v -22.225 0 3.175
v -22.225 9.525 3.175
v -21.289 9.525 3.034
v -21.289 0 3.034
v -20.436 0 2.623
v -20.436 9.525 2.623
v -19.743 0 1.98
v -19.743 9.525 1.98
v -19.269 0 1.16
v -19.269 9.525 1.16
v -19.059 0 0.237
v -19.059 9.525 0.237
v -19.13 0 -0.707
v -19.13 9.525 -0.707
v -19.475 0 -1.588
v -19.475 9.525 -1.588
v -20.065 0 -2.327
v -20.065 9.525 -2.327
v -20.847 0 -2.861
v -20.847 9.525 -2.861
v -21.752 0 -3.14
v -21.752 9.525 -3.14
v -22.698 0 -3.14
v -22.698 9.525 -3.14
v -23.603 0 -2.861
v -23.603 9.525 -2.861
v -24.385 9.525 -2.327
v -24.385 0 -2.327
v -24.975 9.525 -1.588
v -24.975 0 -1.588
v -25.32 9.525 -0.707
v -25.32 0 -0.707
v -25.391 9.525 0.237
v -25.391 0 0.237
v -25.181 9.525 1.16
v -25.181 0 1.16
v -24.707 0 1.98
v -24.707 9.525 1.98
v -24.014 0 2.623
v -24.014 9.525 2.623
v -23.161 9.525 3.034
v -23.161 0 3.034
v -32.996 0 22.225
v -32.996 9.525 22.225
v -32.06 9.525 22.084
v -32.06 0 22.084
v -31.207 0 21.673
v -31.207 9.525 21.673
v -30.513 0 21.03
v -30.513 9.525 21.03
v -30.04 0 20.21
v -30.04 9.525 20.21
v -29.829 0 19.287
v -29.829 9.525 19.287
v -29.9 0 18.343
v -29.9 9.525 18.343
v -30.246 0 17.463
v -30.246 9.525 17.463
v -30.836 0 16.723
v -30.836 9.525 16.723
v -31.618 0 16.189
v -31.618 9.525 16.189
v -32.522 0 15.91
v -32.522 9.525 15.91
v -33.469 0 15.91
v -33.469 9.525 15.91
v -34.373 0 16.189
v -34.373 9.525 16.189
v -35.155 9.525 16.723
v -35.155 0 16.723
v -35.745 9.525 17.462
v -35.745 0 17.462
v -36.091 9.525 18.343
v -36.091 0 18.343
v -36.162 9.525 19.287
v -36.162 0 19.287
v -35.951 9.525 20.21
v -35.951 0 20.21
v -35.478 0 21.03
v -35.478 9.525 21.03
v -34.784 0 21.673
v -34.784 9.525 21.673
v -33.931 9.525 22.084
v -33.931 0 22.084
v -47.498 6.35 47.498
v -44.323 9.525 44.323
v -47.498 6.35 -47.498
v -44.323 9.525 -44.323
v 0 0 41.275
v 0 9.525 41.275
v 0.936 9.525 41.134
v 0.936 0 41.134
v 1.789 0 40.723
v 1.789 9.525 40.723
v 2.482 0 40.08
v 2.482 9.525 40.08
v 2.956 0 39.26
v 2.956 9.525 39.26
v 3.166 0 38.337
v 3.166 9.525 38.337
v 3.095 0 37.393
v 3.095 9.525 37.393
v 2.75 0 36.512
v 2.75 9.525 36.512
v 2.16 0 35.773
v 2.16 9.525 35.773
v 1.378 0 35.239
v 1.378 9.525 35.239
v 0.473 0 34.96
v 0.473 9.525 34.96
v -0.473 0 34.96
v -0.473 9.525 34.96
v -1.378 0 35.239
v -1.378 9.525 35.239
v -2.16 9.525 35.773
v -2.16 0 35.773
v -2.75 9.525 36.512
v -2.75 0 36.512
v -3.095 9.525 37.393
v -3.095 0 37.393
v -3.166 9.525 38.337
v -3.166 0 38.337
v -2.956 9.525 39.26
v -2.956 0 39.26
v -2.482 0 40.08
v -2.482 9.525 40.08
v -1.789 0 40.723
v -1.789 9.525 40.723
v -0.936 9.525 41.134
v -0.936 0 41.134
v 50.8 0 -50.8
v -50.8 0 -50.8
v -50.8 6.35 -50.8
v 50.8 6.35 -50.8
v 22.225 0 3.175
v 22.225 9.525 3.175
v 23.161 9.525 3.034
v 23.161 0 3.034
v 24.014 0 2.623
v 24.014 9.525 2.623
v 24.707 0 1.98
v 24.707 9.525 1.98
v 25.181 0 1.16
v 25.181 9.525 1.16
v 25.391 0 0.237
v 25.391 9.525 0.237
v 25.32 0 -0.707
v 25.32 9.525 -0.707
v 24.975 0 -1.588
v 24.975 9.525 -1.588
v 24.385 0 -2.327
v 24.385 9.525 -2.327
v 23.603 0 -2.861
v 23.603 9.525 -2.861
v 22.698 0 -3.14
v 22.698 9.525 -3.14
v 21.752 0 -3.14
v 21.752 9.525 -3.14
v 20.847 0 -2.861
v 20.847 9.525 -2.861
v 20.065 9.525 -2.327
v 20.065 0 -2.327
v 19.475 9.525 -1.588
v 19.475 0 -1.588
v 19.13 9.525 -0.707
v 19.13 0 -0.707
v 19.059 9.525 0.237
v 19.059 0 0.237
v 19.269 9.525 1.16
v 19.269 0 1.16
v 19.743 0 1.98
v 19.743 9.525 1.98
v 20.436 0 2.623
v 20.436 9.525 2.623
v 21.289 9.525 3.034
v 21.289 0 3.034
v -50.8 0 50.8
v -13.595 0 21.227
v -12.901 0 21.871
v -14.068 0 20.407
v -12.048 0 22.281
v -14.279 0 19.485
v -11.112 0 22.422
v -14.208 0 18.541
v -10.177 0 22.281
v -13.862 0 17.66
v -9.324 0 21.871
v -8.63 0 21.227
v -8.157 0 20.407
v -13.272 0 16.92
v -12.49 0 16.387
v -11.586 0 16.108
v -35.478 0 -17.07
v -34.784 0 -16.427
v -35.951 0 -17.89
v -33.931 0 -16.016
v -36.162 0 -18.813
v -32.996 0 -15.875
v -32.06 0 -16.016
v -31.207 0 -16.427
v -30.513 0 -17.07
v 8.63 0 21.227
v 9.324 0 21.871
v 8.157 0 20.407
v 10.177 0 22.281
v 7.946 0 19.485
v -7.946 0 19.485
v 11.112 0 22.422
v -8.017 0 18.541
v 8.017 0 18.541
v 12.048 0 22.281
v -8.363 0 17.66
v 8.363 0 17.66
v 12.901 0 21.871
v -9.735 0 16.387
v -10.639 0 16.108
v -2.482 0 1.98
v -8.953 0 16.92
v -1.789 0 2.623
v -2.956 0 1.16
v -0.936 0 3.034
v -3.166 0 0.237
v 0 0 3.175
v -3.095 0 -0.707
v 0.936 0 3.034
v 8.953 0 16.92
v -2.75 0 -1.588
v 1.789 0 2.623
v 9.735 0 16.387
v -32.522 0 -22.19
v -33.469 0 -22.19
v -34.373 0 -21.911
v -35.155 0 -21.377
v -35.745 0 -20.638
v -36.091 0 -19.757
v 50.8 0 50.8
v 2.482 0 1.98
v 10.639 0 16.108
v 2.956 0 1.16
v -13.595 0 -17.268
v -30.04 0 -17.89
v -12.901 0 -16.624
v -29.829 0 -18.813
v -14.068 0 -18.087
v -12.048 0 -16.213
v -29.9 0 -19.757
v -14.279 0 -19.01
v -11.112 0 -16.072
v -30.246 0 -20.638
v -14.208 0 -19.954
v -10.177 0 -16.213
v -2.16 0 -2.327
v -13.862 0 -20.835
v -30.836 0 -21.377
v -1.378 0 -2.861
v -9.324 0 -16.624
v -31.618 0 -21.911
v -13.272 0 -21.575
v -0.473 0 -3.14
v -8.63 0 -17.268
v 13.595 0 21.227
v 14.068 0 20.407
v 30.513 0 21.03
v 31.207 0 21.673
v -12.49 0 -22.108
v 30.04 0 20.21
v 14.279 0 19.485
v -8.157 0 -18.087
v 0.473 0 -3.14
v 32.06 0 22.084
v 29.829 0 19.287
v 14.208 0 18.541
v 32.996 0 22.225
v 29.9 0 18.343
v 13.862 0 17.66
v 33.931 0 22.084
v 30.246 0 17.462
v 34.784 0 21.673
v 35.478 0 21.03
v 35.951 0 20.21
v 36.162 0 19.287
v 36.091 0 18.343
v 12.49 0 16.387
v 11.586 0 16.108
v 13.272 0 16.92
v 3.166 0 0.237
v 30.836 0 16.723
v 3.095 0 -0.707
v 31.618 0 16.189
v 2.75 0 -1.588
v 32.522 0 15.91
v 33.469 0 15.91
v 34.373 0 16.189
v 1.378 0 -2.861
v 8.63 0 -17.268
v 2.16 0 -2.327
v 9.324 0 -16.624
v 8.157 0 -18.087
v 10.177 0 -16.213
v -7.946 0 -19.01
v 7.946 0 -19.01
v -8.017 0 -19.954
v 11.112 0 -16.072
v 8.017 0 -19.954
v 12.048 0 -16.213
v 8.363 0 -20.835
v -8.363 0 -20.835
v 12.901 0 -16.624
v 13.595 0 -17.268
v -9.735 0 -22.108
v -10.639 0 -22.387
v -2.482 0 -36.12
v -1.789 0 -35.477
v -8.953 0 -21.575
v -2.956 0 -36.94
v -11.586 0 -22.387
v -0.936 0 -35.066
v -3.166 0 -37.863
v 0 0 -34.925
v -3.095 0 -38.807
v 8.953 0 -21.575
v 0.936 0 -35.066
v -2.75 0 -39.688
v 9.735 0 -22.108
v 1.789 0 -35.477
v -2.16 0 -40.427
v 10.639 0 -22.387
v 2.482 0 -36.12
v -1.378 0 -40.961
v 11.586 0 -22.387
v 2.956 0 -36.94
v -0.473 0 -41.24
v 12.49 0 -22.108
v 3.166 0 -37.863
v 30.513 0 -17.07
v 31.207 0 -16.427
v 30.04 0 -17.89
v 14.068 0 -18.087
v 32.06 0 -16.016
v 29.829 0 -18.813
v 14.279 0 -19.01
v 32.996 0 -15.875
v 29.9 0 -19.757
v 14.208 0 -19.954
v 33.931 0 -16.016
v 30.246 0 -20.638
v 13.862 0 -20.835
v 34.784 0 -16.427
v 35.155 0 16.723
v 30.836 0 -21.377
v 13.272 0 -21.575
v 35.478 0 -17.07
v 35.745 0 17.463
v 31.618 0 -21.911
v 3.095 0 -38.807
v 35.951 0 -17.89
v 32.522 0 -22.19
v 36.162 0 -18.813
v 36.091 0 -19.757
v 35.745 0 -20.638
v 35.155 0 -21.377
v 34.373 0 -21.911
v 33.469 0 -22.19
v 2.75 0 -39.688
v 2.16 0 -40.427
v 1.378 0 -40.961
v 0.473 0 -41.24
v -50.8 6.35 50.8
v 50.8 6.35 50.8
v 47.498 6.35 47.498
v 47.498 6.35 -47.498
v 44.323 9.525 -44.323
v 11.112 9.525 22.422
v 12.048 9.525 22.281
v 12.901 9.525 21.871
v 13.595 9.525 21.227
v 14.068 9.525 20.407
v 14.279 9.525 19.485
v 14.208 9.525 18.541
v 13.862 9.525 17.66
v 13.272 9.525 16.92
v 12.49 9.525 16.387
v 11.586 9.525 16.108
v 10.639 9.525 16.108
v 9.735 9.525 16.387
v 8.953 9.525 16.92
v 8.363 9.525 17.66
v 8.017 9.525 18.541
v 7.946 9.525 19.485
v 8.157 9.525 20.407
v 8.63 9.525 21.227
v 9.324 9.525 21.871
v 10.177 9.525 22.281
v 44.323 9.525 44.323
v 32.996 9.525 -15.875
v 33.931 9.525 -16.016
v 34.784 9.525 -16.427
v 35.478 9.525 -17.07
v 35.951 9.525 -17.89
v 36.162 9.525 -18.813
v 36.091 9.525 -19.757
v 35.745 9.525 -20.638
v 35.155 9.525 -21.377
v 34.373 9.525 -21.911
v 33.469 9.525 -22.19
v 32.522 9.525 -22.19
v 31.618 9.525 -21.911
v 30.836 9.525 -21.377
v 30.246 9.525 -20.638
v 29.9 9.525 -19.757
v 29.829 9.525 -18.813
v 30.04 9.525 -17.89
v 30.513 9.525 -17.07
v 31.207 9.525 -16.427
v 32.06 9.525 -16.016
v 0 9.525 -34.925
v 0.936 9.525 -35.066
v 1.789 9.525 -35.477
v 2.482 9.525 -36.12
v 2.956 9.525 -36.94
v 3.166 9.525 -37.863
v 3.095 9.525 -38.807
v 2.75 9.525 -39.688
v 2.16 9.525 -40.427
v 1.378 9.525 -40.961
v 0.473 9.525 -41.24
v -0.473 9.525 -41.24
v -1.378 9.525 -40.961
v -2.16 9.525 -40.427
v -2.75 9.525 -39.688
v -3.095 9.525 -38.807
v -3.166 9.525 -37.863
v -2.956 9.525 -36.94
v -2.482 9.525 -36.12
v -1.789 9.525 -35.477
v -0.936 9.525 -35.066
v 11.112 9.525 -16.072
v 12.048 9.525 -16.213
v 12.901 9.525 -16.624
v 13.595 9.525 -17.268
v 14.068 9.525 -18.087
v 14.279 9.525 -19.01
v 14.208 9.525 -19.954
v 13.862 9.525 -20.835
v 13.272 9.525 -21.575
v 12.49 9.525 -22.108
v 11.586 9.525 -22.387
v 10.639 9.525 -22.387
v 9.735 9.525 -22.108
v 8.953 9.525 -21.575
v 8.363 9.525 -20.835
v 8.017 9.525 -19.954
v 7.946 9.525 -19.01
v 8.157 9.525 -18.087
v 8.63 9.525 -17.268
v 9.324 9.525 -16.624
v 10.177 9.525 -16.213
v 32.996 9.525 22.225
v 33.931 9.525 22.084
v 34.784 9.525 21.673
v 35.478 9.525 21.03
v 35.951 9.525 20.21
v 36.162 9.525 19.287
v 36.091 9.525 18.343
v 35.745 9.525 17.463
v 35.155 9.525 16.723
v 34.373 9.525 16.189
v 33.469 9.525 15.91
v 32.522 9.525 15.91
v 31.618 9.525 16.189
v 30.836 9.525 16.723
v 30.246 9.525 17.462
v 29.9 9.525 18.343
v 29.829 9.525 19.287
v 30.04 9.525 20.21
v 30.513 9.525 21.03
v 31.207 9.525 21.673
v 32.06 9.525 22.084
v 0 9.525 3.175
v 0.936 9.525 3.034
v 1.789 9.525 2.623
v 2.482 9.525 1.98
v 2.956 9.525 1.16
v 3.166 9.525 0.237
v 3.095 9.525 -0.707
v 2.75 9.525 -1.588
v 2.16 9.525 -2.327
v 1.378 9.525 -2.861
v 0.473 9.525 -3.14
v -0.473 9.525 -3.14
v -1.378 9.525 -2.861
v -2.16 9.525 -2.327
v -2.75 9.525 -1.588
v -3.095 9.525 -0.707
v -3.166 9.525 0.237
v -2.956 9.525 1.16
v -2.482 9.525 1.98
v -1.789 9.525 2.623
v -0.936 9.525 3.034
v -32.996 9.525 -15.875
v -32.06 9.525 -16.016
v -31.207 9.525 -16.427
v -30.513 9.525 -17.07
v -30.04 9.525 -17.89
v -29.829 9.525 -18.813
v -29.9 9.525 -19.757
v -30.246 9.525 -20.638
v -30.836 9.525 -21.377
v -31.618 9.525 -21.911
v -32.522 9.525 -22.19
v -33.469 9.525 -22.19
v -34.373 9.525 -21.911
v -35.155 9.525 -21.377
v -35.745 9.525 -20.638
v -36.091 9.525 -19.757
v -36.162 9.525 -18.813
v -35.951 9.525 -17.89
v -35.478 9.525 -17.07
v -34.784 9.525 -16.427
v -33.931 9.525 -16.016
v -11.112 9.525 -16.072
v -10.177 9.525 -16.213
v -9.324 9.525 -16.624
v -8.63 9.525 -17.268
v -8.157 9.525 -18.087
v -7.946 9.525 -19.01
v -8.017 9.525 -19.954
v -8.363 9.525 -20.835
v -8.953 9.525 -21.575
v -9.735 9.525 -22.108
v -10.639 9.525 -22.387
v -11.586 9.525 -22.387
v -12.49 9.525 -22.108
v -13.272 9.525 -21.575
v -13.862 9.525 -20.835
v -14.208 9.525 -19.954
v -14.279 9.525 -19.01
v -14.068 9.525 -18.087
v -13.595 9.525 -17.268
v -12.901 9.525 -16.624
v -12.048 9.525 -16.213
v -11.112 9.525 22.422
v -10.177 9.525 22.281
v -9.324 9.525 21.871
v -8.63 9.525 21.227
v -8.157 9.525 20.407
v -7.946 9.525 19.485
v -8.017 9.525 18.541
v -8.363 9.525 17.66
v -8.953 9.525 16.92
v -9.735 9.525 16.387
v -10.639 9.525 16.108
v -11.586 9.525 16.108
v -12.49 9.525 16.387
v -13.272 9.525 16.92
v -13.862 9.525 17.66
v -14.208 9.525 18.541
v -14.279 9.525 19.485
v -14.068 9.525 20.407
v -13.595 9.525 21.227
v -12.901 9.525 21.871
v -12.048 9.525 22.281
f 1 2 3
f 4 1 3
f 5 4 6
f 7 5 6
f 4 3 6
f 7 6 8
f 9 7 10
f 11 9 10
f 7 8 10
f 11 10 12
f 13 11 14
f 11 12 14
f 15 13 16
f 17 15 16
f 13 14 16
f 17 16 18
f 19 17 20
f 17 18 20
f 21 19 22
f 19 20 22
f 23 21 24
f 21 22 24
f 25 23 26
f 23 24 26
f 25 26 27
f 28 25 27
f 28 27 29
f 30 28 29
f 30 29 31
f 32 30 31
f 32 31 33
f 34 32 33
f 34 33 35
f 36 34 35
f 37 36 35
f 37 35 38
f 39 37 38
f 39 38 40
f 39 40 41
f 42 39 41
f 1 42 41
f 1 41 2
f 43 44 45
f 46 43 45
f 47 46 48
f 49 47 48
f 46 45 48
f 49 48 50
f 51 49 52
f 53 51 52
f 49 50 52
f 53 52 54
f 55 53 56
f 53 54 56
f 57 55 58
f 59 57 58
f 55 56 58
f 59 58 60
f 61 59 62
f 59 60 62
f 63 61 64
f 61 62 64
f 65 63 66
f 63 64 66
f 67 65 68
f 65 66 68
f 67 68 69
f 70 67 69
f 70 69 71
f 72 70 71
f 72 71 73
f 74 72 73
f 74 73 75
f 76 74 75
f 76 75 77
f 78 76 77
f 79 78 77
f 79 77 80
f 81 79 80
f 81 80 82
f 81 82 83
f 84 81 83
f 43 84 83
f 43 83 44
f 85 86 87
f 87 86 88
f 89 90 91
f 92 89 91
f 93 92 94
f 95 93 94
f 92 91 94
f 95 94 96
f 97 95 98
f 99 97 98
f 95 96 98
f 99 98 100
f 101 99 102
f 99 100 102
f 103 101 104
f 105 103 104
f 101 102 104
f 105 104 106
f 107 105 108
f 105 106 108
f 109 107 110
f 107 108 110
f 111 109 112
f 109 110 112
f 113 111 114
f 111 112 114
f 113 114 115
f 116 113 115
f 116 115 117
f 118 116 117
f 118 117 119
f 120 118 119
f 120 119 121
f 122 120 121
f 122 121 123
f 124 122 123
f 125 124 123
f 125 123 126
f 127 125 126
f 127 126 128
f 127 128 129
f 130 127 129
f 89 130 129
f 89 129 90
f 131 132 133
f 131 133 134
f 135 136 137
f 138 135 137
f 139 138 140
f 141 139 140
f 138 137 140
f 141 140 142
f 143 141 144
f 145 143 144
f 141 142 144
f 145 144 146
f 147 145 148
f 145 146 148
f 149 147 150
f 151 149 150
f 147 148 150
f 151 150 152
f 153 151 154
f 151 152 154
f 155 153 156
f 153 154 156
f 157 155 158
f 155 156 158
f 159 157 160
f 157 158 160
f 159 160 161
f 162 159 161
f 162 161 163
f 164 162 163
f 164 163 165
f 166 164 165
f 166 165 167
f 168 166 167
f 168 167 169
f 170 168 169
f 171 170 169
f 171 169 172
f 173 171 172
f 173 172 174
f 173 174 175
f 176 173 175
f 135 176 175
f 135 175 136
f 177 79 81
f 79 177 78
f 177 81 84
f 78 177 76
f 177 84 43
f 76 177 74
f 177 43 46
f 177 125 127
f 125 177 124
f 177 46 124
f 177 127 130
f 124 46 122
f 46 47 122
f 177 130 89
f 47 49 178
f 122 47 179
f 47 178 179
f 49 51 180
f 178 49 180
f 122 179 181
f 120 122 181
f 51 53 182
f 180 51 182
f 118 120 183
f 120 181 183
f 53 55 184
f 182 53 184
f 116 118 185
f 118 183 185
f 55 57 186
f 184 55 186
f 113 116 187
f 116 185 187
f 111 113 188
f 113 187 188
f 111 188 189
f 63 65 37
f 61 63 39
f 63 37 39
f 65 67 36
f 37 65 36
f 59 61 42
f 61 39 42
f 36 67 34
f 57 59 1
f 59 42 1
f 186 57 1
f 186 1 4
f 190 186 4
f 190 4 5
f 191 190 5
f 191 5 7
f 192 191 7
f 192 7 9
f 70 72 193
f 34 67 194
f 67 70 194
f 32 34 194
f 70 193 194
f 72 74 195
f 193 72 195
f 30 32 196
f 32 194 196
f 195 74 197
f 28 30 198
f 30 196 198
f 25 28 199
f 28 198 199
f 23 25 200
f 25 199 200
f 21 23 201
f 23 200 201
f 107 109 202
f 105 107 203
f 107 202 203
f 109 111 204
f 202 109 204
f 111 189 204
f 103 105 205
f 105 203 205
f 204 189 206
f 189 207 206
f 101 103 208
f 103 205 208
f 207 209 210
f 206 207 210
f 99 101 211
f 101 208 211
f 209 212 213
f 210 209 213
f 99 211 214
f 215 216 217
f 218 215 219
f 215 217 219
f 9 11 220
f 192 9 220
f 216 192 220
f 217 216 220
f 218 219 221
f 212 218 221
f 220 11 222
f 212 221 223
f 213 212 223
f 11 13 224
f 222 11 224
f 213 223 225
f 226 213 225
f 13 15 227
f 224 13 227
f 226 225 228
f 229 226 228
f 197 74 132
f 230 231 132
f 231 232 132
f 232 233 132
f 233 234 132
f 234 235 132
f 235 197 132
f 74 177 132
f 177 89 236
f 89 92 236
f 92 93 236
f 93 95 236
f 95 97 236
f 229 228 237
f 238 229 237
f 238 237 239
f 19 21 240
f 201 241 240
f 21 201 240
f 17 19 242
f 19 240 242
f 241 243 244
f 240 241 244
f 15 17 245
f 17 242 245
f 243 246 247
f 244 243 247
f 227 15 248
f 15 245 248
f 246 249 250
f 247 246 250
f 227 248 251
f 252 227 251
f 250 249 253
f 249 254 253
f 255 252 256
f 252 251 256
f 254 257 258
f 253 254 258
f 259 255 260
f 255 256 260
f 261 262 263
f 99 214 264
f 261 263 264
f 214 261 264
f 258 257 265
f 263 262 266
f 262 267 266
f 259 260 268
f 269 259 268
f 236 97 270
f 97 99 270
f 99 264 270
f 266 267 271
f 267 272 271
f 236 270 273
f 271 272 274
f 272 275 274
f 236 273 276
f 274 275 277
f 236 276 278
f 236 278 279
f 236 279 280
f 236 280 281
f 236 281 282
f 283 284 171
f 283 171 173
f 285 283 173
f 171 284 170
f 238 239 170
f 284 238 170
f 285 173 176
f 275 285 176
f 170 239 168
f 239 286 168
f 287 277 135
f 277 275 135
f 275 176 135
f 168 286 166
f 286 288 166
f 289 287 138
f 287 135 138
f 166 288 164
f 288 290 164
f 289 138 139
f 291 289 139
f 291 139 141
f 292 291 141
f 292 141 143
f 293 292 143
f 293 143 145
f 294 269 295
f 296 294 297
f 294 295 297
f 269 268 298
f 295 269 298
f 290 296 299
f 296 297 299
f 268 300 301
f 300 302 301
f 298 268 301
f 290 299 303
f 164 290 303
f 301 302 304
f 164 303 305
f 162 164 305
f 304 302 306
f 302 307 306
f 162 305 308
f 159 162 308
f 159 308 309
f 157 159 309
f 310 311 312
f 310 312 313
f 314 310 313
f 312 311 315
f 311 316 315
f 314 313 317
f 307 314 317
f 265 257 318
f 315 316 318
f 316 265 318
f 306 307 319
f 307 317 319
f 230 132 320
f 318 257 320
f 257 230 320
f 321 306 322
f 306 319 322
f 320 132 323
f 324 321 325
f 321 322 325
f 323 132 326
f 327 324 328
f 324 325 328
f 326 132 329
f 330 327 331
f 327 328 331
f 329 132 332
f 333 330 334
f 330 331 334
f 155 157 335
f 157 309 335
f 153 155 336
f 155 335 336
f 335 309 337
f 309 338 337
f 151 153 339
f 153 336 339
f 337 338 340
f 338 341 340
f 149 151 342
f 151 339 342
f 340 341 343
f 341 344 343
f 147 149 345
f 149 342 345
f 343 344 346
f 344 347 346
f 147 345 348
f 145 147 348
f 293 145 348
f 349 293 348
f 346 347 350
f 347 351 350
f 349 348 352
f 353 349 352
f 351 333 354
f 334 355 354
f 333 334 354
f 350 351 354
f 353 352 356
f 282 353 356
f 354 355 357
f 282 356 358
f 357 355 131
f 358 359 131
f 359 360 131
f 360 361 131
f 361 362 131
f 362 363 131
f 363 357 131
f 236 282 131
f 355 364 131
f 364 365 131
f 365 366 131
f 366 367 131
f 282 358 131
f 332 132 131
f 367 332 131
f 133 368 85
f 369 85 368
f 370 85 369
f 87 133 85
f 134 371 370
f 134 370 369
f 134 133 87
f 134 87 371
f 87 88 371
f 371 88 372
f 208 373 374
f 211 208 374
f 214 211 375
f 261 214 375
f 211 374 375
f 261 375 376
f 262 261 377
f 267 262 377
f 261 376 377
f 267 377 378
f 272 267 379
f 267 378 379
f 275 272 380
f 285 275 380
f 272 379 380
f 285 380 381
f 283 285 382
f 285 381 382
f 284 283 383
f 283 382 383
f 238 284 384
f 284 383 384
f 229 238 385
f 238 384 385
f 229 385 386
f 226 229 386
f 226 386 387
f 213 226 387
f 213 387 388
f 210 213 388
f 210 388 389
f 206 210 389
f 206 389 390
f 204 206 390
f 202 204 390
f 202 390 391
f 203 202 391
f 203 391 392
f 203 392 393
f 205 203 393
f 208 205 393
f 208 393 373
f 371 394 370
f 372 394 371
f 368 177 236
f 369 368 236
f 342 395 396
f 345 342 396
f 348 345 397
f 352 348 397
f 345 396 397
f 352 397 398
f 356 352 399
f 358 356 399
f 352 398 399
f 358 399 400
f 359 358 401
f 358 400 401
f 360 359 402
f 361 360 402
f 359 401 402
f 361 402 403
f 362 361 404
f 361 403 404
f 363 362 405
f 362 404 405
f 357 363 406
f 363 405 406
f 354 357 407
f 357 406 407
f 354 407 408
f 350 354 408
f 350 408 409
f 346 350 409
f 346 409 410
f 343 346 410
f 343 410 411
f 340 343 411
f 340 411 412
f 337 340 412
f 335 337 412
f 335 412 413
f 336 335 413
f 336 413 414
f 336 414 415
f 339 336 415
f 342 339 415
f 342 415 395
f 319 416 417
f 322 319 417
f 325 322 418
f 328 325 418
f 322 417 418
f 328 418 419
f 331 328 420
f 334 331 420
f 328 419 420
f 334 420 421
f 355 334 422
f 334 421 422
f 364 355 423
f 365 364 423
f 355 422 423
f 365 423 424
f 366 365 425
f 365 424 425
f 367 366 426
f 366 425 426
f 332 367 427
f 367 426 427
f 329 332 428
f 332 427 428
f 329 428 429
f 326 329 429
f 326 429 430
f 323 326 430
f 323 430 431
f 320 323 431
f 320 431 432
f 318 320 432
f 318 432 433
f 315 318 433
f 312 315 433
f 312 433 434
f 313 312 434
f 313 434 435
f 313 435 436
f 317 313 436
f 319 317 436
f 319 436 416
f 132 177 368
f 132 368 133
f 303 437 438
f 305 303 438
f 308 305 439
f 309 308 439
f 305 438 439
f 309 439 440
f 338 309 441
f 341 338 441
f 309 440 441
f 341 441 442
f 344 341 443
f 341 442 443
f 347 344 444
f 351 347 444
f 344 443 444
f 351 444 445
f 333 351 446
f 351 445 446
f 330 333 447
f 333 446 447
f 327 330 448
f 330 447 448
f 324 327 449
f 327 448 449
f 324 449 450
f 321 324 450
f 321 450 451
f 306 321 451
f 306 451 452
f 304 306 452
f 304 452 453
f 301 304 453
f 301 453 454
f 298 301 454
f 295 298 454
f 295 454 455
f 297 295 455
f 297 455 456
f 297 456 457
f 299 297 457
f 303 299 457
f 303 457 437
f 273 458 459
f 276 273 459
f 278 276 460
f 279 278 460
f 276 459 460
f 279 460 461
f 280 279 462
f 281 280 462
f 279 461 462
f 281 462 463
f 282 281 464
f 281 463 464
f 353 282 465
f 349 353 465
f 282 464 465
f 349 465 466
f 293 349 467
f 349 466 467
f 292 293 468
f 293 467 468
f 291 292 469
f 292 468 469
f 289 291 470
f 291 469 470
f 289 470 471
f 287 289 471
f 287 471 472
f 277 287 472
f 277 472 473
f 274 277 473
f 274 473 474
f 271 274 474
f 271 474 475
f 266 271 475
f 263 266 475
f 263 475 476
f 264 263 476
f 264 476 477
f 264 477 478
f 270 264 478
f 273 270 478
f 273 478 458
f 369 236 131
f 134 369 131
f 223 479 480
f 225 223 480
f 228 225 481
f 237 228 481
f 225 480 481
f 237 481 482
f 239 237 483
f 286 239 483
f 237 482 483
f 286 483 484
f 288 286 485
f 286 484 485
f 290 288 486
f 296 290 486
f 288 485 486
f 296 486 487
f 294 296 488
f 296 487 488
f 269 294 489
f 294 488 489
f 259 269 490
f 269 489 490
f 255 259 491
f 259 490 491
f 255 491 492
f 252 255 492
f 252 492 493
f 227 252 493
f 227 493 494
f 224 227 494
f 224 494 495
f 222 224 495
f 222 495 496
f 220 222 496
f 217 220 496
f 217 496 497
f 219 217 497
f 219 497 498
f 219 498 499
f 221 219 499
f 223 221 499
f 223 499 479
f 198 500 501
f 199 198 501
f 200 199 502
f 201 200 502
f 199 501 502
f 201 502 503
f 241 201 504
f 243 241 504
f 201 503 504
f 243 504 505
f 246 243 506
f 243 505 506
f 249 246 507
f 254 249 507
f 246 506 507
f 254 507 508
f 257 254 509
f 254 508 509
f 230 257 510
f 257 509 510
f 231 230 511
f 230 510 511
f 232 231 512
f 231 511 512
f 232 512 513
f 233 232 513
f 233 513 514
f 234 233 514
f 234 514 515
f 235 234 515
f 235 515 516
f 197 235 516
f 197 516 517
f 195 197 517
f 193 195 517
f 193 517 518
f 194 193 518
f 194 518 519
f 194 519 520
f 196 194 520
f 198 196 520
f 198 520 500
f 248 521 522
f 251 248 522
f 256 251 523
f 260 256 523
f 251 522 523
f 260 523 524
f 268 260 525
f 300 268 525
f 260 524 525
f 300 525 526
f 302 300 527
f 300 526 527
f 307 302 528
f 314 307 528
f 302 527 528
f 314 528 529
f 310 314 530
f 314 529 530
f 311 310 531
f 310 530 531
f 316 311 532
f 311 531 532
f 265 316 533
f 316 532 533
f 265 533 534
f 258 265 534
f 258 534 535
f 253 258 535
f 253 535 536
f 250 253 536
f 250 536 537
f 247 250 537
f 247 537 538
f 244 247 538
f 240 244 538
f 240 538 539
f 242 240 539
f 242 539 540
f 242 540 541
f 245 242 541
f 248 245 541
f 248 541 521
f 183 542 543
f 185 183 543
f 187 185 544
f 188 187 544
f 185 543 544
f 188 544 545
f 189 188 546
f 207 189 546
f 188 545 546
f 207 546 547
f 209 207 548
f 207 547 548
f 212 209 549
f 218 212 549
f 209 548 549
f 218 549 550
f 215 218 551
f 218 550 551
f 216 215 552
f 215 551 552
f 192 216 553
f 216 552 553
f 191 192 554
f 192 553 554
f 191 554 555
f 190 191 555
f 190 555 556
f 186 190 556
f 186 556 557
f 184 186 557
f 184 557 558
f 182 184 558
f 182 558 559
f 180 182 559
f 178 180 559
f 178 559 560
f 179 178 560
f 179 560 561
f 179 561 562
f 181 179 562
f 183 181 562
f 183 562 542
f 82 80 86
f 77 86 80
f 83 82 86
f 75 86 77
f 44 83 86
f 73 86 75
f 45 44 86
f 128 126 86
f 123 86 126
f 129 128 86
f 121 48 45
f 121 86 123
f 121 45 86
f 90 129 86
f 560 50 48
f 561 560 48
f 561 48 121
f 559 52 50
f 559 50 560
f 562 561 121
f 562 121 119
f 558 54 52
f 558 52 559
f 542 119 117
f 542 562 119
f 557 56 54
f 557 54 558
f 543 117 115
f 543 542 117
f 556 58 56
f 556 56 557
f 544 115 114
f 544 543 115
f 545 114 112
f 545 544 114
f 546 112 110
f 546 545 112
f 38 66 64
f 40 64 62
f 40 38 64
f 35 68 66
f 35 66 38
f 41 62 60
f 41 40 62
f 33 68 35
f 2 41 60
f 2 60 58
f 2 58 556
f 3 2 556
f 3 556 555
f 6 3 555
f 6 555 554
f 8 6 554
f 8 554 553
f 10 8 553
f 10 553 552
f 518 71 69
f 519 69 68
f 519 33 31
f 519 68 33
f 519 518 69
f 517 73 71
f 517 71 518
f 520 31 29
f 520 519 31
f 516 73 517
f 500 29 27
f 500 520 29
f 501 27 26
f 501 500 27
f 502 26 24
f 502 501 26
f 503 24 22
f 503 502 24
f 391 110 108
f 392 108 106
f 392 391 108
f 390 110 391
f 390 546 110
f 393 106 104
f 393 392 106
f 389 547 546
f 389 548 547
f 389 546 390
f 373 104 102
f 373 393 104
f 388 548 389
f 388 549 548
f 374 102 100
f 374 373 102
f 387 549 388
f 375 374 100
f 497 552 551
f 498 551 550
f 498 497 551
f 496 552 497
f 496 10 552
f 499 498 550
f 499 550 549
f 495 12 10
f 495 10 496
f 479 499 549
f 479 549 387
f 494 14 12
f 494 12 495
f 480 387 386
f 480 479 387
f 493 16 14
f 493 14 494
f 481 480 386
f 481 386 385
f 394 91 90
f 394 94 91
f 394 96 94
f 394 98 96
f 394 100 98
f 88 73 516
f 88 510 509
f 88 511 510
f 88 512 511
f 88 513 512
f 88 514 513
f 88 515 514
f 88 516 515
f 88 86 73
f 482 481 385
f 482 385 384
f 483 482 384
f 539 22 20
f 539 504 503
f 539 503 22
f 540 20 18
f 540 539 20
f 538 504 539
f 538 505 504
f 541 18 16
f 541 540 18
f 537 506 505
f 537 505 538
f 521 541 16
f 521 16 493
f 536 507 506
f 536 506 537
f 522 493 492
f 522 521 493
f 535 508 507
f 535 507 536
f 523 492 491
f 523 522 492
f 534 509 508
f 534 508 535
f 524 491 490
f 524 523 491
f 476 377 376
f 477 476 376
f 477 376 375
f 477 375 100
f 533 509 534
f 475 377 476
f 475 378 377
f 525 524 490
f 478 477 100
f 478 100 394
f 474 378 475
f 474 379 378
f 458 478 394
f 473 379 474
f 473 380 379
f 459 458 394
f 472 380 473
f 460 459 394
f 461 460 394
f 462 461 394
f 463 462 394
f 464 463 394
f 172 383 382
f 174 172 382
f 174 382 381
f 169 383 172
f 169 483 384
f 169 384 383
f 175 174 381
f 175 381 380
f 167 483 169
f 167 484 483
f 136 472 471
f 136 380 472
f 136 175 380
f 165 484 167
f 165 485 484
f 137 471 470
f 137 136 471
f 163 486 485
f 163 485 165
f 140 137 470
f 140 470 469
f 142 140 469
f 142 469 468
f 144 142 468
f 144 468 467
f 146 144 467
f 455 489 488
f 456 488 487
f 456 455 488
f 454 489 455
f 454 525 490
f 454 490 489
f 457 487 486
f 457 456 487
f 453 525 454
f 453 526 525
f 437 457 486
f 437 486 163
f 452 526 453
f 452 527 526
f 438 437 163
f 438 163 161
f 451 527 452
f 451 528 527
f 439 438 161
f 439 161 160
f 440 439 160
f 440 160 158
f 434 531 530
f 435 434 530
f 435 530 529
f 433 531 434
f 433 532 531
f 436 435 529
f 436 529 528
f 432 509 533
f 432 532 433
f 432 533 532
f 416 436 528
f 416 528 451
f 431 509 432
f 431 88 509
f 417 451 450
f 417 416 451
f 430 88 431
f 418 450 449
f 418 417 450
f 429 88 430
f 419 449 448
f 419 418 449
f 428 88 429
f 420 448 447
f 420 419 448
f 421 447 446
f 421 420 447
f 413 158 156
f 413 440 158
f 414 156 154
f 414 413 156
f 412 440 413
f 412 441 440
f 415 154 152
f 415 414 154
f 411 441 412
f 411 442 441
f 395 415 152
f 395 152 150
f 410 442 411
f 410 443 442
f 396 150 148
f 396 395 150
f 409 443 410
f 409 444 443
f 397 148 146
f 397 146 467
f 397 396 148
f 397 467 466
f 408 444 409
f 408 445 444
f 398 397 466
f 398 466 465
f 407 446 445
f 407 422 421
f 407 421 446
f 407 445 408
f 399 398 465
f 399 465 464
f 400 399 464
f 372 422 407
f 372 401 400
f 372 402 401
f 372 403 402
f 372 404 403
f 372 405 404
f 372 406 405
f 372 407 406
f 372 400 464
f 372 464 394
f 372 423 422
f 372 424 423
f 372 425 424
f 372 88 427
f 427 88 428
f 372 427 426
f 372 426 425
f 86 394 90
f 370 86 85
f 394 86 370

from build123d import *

# Parameters (mm, degrees)
SKETCH1_W           = 101.6
SKETCH1_H           = 101.6
BOSS_EXTRUDE1_DEPTH = 9.525
SKETCH2_OUTSIDE_W   = 132.4
SKETCH2_OUTSIDE_H   = 132.4
SKETCH2_OUTSIDE_W_2 = 94.996
SKETCH2_OUTSIDE_H_2 = 94.996
CUT_EXTRUDE1_DEPTH  = 3.175
CHAMFER1_SIZE       = 3.175
CUT_EXTRUDE2_REACH  = 74.471
SKETCH3_R           = 3.175


with BuildPart() as part:
    # Sketch1 → Boss-Extrude1 (new body)
    with BuildSketch(Plane(origin=(0, 0, 0), x_dir=(1, 0, 0), z_dir=(0, 1, 0))):
        Rectangle(SKETCH1_W, SKETCH1_H)
    extrude(amount=BOSS_EXTRUDE1_DEPTH)

    # Sketch2 outside → Cut-Extrude1 (cut)
    with BuildSketch(Plane(origin=(0, 9.525, 0), x_dir=(1, 0, 0), z_dir=(0, 1, 0))):
        Rectangle(SKETCH2_OUTSIDE_W, SKETCH2_OUTSIDE_H)
        Rectangle(SKETCH2_OUTSIDE_W_2, SKETCH2_OUTSIDE_H_2, mode=Mode.SUBTRACT)
    extrude(amount=-CUT_EXTRUDE1_DEPTH, mode=Mode.SUBTRACT)

    # Chamfer1
    chamfer1_edges = [part.edges().sort_by_distance(p)[0] for p in [
        (47.498, 9.525, 0),
        (0, 9.525, -47.498),
        (-47.498, 9.525, 0),
        (0, 9.525, 47.498),
    ]]
    chamfer(chamfer1_edges, length=CHAMFER1_SIZE - 0.0001)  # a hair under: the kernel refuses the full size

    # Sketch3 → Cut-Extrude2 (cut, up to next)
    with BuildSketch(Plane(origin=(0, 9.525, 0), x_dir=(1, 0, 0), z_dir=(0, 1, 0)), mode=Mode.PRIVATE) as cut_extrude2_sk1:
        with Locations(Location((0, 38.1, 0), (0, 0, 270))):
            Circle(SKETCH3_R)
    cut_extrude2_tool1 = extrude(cut_extrude2_sk1.sketch, amount=-CUT_EXTRUDE2_REACH, mode=Mode.PRIVATE) & part.part
    # Sketch3 → Cut-Extrude2 (cut, up to next)
    with BuildSketch(Plane(origin=(0, 9.525, 0), x_dir=(1, 0, 0), z_dir=(0, 1, 0)), mode=Mode.PRIVATE) as cut_extrude2_sk2:
        with Locations(Location((32.995567884, 19.05, 0), (0, 0, 270))):
            Circle(SKETCH3_R)
    cut_extrude2_tool2 = extrude(cut_extrude2_sk2.sketch, amount=-CUT_EXTRUDE2_REACH, mode=Mode.PRIVATE) & part.part
    # Sketch3 → Cut-Extrude2 (cut, up to next)
    with BuildSketch(Plane(origin=(0, 9.525, 0), x_dir=(1, 0, 0), z_dir=(0, 1, 0)), mode=Mode.PRIVATE) as cut_extrude2_sk3:
        with Locations(Location((32.995567884, -19.05, 0), (0, 0, 270))):
            Circle(SKETCH3_R)
    cut_extrude2_tool3 = extrude(cut_extrude2_sk3.sketch, amount=-CUT_EXTRUDE2_REACH, mode=Mode.PRIVATE) & part.part
    # Sketch3 → Cut-Extrude2 (cut, up to next)
    with BuildSketch(Plane(origin=(0, 9.525, 0), x_dir=(1, 0, 0), z_dir=(0, 1, 0)), mode=Mode.PRIVATE) as cut_extrude2_sk4:
        with Locations(Location((0, -38.1, 0), (0, 0, 270))):
            Circle(SKETCH3_R)
    cut_extrude2_tool4 = extrude(cut_extrude2_sk4.sketch, amount=-CUT_EXTRUDE2_REACH, mode=Mode.PRIVATE) & part.part
    # Sketch3 → Cut-Extrude2 (cut, up to next)
    with BuildSketch(Plane(origin=(0, 9.525, 0), x_dir=(1, 0, 0), z_dir=(0, 1, 0)), mode=Mode.PRIVATE) as cut_extrude2_sk5:
        with Locations(Location((-32.995567884, -19.05, 0), (0, 0, 270))):
            Circle(SKETCH3_R)
    cut_extrude2_tool5 = extrude(cut_extrude2_sk5.sketch, amount=-CUT_EXTRUDE2_REACH, mode=Mode.PRIVATE) & part.part
    # Sketch3 → Cut-Extrude2 (cut, up to next)
    with BuildSketch(Plane(origin=(0, 9.525, 0), x_dir=(1, 0, 0), z_dir=(0, 1, 0)), mode=Mode.PRIVATE) as cut_extrude2_sk6:
        with Locations(Location((-32.995567884, 19.05, 0), (0, 0, 270))):
            Circle(SKETCH3_R)
    cut_extrude2_tool6 = extrude(cut_extrude2_sk6.sketch, amount=-CUT_EXTRUDE2_REACH, mode=Mode.PRIVATE) & part.part
    # Sketch3 → Cut-Extrude2 (cut, up to next)
    with BuildSketch(Plane(origin=(0, 9.525, 0), x_dir=(1, 0, 0), z_dir=(0, 1, 0)), mode=Mode.PRIVATE) as cut_extrude2_sk7:
        with Locations(Location((22.225, 0, 0), (0, 0, 270))):
            Circle(SKETCH3_R)
    cut_extrude2_tool7 = extrude(cut_extrude2_sk7.sketch, amount=-CUT_EXTRUDE2_REACH, mode=Mode.PRIVATE) & part.part
    # Sketch3 → Cut-Extrude2 (cut, up to next)
    with BuildSketch(Plane(origin=(0, 9.525, 0), x_dir=(1, 0, 0), z_dir=(0, 1, 0)), mode=Mode.PRIVATE) as cut_extrude2_sk8:
        with Locations(Location((11.1125, -19.247414599, 0), (0, 0, 270))):
            Circle(SKETCH3_R)
    cut_extrude2_tool8 = extrude(cut_extrude2_sk8.sketch, amount=-CUT_EXTRUDE2_REACH, mode=Mode.PRIVATE) & part.part
    # Sketch3 → Cut-Extrude2 (cut, up to next)
    with BuildSketch(Plane(origin=(0, 9.525, 0), x_dir=(1, 0, 0), z_dir=(0, 1, 0)), mode=Mode.PRIVATE) as cut_extrude2_sk9:
        with Locations(Location((-11.1125, -19.247414599, 0), (0, 0, 270))):
            Circle(SKETCH3_R)
    cut_extrude2_tool9 = extrude(cut_extrude2_sk9.sketch, amount=-CUT_EXTRUDE2_REACH, mode=Mode.PRIVATE) & part.part
    # Sketch3 → Cut-Extrude2 (cut, up to next)
    with BuildSketch(Plane(origin=(0, 9.525, 0), x_dir=(1, 0, 0), z_dir=(0, 1, 0)), mode=Mode.PRIVATE) as cut_extrude2_sk10:
        with Locations(Location((-22.225, 0, 0), (0, 0, 270))):
            Circle(SKETCH3_R)
    cut_extrude2_tool10 = extrude(cut_extrude2_sk10.sketch, amount=-CUT_EXTRUDE2_REACH, mode=Mode.PRIVATE) & part.part
    # Sketch3 → Cut-Extrude2 (cut, up to next)
    with BuildSketch(Plane(origin=(0, 9.525, 0), x_dir=(1, 0, 0), z_dir=(0, 1, 0)), mode=Mode.PRIVATE) as cut_extrude2_sk11:
        with Locations(Location((-11.1125, 19.247414599, 0), (0, 0, 270))):
            Circle(SKETCH3_R)
    cut_extrude2_tool11 = extrude(cut_extrude2_sk11.sketch, amount=-CUT_EXTRUDE2_REACH, mode=Mode.PRIVATE) & part.part
    # Sketch3 → Cut-Extrude2 (cut, up to next)
    with BuildSketch(Plane(origin=(0, 9.525, 0), x_dir=(1, 0, 0), z_dir=(0, 1, 0)), mode=Mode.PRIVATE) as cut_extrude2_sk12:
        with Locations(Location((11.1125, 19.247414599, 0), (0, 0, 270))):
            Circle(SKETCH3_R)
    cut_extrude2_tool12 = extrude(cut_extrude2_sk12.sketch, amount=-CUT_EXTRUDE2_REACH, mode=Mode.PRIVATE) & part.part
    # Sketch3 → Cut-Extrude2 (cut, up to next)
    with BuildSketch(Plane(origin=(0, 9.525, 0), x_dir=(1, 0, 0), z_dir=(0, 1, 0)), mode=Mode.PRIVATE) as cut_extrude2_sk13:
        with Locations(Location((0, 0, 0), (0, 0, 270))):
            Circle(SKETCH3_R)
    cut_extrude2_tool13 = extrude(cut_extrude2_sk13.sketch, amount=-CUT_EXTRUDE2_REACH, mode=Mode.PRIVATE) & part.part
    add(cut_extrude2_tool1.solids().sort_by_distance((0, 9.525, -38.1))[0], mode=Mode.SUBTRACT)
    add(cut_extrude2_tool2.solids().sort_by_distance((32.995568, 9.525, -19.05))[0], mode=Mode.SUBTRACT)
    add(cut_extrude2_tool3.solids().sort_by_distance((32.995568, 9.525, 19.05))[0], mode=Mode.SUBTRACT)
    add(cut_extrude2_tool4.solids().sort_by_distance((0, 9.525, 38.1))[0], mode=Mode.SUBTRACT)
    add(cut_extrude2_tool5.solids().sort_by_distance((-32.995568, 9.525, 19.05))[0], mode=Mode.SUBTRACT)
    add(cut_extrude2_tool6.solids().sort_by_distance((-32.995568, 9.525, -19.05))[0], mode=Mode.SUBTRACT)
    add(cut_extrude2_tool7.solids().sort_by_distance((22.225, 9.525, 0))[0], mode=Mode.SUBTRACT)
    add(cut_extrude2_tool8.solids().sort_by_distance((11.1125, 9.525, 19.247415))[0], mode=Mode.SUBTRACT)
    add(cut_extrude2_tool9.solids().sort_by_distance((-11.1125, 9.525, 19.247415))[0], mode=Mode.SUBTRACT)
    add(cut_extrude2_tool10.solids().sort_by_distance((-22.225, 9.525, 0))[0], mode=Mode.SUBTRACT)
    add(cut_extrude2_tool11.solids().sort_by_distance((-11.1125, 9.525, -19.247415))[0], mode=Mode.SUBTRACT)
    add(cut_extrude2_tool12.solids().sort_by_distance((11.1125, 9.525, -19.247415))[0], mode=Mode.SUBTRACT)
    add(cut_extrude2_tool13.solids().sort_by_distance((0, 9.525, 0))[0], mode=Mode.SUBTRACT)


solid = part.part
